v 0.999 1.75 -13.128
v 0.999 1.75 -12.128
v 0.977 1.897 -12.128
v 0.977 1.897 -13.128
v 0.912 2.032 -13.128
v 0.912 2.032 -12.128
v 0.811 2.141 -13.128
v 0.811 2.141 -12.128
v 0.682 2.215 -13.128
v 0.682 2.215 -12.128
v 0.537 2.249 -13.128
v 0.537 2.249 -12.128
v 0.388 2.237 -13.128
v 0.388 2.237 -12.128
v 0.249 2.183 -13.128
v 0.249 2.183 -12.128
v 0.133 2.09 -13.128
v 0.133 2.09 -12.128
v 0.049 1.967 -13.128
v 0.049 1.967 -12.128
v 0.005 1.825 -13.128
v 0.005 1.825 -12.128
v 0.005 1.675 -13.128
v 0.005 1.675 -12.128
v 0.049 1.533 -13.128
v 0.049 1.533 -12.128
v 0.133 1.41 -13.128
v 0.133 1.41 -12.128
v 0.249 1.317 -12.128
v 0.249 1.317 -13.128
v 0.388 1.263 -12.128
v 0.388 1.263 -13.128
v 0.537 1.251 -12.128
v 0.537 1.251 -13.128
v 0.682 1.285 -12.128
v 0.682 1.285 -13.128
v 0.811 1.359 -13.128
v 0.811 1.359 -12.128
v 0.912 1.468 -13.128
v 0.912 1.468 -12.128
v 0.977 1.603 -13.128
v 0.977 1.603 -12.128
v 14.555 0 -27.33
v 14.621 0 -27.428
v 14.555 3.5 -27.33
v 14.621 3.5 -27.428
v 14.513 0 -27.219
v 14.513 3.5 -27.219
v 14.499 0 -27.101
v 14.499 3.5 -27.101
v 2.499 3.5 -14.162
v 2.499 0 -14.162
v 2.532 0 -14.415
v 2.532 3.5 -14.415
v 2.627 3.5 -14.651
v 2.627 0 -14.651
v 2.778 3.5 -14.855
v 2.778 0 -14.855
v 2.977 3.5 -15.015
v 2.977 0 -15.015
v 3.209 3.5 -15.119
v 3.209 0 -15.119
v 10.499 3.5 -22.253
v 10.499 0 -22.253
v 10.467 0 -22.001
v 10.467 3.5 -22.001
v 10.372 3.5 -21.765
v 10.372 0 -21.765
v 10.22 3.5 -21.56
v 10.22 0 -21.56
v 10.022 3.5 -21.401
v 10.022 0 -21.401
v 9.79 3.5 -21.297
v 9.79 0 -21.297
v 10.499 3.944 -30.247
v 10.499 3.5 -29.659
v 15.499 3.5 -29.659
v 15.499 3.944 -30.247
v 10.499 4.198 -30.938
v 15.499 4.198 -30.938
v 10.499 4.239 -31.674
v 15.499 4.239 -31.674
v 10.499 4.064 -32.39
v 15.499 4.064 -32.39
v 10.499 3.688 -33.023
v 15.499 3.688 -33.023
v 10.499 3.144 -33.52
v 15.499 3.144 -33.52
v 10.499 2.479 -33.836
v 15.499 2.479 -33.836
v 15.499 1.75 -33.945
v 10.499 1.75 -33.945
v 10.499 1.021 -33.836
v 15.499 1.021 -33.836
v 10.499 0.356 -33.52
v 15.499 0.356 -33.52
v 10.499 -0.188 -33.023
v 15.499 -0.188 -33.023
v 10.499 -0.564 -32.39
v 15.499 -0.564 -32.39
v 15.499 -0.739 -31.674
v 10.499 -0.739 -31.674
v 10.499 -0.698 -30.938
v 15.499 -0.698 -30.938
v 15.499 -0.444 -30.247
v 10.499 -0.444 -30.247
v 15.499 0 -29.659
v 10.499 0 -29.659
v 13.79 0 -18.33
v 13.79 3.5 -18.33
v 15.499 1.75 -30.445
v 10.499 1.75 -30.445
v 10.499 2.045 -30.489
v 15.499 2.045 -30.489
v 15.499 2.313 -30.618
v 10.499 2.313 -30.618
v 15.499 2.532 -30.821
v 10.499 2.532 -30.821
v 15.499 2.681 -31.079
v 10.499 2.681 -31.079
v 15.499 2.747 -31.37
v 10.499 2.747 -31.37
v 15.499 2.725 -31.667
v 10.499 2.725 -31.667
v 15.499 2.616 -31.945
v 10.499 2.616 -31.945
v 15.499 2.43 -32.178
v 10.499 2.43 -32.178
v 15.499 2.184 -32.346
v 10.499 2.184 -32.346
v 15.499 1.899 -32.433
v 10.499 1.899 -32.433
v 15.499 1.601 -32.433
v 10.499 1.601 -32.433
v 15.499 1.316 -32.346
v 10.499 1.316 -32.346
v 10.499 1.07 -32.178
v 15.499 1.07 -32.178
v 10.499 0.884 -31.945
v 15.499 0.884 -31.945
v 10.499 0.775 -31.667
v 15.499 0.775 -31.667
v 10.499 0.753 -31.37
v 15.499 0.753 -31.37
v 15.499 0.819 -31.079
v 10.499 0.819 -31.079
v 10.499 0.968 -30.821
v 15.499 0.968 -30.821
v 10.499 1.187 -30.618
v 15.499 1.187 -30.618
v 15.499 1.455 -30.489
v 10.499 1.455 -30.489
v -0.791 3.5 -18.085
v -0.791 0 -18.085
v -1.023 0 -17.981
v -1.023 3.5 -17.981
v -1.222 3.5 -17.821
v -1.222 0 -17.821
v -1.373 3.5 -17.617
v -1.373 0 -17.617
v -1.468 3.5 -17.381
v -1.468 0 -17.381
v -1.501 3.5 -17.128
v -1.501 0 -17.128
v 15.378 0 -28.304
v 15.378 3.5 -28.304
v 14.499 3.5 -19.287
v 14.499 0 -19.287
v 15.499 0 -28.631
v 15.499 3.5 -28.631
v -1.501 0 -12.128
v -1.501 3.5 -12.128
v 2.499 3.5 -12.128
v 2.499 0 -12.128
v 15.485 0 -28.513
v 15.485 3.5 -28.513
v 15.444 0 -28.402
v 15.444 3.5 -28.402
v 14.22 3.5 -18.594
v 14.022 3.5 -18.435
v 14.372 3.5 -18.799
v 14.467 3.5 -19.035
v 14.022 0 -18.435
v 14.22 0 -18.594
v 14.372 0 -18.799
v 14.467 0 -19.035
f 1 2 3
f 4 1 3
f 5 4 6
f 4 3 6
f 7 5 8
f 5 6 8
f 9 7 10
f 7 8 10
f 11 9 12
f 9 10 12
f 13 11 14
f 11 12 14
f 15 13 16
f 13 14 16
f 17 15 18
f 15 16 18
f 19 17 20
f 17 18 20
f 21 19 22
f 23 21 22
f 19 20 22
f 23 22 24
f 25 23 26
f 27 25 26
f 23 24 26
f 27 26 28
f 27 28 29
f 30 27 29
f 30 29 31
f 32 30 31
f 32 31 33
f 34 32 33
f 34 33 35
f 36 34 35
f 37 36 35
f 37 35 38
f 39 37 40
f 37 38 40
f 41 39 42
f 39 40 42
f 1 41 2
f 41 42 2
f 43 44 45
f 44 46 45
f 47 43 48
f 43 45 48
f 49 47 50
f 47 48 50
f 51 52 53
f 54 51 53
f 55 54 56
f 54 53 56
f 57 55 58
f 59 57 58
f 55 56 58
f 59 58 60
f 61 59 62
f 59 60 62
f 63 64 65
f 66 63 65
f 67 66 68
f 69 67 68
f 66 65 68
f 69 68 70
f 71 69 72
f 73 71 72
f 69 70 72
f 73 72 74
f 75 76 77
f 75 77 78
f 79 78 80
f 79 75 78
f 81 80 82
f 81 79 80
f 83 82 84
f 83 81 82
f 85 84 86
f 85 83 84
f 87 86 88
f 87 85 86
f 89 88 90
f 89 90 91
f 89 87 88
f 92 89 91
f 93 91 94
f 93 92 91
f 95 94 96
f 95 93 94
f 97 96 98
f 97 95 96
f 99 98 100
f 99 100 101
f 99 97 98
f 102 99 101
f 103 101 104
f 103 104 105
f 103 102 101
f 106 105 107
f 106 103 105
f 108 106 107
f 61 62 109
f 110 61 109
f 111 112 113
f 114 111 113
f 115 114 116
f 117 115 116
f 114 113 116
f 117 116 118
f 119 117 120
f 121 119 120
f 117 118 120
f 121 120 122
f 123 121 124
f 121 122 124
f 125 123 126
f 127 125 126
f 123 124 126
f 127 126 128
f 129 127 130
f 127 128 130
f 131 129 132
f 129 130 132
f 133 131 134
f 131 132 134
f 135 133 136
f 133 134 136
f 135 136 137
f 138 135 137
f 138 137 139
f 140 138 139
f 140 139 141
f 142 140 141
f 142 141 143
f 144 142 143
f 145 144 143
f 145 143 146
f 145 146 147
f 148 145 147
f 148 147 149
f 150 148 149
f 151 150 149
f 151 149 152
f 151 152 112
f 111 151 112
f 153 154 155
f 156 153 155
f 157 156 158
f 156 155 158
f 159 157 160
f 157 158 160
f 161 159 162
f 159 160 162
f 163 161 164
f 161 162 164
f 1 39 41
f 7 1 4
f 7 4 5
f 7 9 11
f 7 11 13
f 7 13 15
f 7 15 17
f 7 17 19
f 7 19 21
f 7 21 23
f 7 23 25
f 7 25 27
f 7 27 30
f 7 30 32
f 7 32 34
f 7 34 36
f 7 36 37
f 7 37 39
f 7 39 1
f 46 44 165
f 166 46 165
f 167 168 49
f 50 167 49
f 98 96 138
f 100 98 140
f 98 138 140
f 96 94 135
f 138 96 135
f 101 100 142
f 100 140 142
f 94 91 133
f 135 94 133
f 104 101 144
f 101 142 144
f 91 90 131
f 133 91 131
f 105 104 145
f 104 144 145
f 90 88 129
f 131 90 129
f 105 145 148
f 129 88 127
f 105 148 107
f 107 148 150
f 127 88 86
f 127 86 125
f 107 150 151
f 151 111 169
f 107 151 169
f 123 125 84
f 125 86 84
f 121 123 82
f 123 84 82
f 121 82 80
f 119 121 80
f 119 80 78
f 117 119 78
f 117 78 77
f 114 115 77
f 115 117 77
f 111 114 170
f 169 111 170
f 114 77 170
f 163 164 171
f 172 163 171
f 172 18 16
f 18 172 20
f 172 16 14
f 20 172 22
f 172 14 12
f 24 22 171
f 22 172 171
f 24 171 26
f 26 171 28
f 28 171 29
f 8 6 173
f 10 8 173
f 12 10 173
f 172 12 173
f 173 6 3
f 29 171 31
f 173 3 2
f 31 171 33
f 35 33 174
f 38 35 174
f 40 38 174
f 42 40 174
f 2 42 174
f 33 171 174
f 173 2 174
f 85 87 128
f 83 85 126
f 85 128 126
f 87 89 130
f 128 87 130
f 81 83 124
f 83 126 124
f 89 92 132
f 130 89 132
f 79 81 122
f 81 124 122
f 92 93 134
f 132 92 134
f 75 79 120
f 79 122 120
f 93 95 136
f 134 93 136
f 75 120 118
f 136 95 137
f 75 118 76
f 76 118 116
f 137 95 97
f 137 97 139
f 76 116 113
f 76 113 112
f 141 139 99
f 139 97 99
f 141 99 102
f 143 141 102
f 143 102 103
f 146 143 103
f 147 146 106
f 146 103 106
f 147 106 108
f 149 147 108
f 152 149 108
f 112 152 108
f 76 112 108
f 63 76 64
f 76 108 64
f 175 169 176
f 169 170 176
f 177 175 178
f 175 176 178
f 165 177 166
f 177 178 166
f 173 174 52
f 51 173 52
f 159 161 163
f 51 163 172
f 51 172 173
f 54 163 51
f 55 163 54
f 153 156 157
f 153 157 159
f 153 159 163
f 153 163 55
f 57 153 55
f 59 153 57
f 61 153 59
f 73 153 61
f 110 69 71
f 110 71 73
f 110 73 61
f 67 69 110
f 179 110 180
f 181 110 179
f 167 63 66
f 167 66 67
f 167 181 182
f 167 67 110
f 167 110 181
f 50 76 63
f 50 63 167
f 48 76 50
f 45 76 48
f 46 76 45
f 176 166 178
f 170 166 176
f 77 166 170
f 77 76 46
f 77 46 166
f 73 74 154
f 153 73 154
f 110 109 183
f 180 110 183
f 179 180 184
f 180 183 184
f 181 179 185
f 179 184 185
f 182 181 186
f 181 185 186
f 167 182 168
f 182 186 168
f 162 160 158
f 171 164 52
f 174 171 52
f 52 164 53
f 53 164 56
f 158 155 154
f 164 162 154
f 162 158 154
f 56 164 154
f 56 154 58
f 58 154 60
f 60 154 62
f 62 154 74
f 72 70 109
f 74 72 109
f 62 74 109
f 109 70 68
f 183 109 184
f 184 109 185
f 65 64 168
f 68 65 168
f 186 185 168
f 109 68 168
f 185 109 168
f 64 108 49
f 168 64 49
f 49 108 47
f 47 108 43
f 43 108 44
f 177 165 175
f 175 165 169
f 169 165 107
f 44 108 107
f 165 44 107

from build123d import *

# Parameters (mm, degrees)
BOSS_EXTRUDE2_DEPTH = 3.5
SKETCH3_R           = 2.5
BOSS_EXTRUDE3_DEPTH = 5
FILLET2_R           = 0.5
SKETCH5_R           = 0.5
CUT_EXTRUDE1_DEPTH  = 1
SKETCH6_R           = 1
CUT_EXTRUDE2_DEPTH  = 6


with BuildPart() as part:
    # Sketch2 → Boss-Extrude2 (new body)
    with BuildSketch(Plane(origin=(0, 0, 0), x_dir=(1, 0, 0), z_dir=(0, 1, 0))):
        with BuildLine():
            Line((-1.500662684, 17.128376176), (-1.500662684, 12.128376176))
            Line((-1.500662684, 12.128376176), (2.499337316, 12.128376176))
            Line((2.499337316, 12.128376176), (2.499337316, 14.162218976))
            ThreePointArc((2.499337316, 14.162218976), (2.696087031, 14.75786063), (3.208915276, 15.119117632))
            Line((3.208915276, 15.119117632), (13.789759356, 18.330440279))
            ThreePointArc((13.789759356, 18.330440279), (14.302587601, 18.691697281), (14.499337316, 19.287338935))
            Line((14.499337316, 19.287338935), (14.499337316, 27.287338935))
            Line((14.499337316, 27.287338935), (15.499337316, 28.444539704))
            Line((15.499337316, 28.444539704), (15.499337316, 28.878255261))
            Line((15.499337316, 28.878255261), (15.499337316, 31.444539704))
            Line((15.499337316, 31.444539704), (10.499337316, 31.444539704))
            Line((10.499337316, 31.444539704), (10.499337316, 26.210120497))
            Line((10.499337316, 26.210120497), (10.499337316, 22.253496135))
            ThreePointArc((10.499337316, 22.253496135), (10.302587601, 21.657854481), (9.789759356, 21.296597478))
            Line((9.789759356, 21.296597478), (-0.791084724, 18.085274832))
            ThreePointArc((-0.791084724, 18.085274832), (-1.303912969, 17.724017829), (-1.500662684, 17.128376176))
        make_face()
    extrude(amount=BOSS_EXTRUDE2_DEPTH)

    # Sketch3 → Boss-Extrude3 (add)
    with BuildSketch(Plane.ZY.offset(-10.499337316)):
        with Locations((-31.444539704, 1.75)):
            Circle(SKETCH3_R)
    extrude(amount=-BOSS_EXTRUDE3_DEPTH)

    # Fillet2
    fillet2_edges = [part.edges().sort_by_distance(p)[0] for p in [
        (15.499337316, 1.75, -28.444539704),
        (14.499337316, 1.75, -27.287338935),
    ]]
    fillet(fillet2_edges, radius=FILLET2_R)

    # Sketch5 → Cut-Extrude1 (cut)
    with BuildSketch(Plane.XY.offset(-12.128376176)):
        with Locations((0.499337316, 1.75)):
            Circle(SKETCH5_R)
    extrude(amount=-CUT_EXTRUDE1_DEPTH, mode=Mode.SUBTRACT)

    # Sketch6 → Cut-Extrude2 (cut, through all)
    with BuildSketch(Plane.ZY.offset(-10.499337316)):
        with Locations((-31.444539704, 1.75)):
            Circle(SKETCH6_R)
    extrude(amount=-CUT_EXTRUDE2_DEPTH, mode=Mode.SUBTRACT)


solid = part.part
